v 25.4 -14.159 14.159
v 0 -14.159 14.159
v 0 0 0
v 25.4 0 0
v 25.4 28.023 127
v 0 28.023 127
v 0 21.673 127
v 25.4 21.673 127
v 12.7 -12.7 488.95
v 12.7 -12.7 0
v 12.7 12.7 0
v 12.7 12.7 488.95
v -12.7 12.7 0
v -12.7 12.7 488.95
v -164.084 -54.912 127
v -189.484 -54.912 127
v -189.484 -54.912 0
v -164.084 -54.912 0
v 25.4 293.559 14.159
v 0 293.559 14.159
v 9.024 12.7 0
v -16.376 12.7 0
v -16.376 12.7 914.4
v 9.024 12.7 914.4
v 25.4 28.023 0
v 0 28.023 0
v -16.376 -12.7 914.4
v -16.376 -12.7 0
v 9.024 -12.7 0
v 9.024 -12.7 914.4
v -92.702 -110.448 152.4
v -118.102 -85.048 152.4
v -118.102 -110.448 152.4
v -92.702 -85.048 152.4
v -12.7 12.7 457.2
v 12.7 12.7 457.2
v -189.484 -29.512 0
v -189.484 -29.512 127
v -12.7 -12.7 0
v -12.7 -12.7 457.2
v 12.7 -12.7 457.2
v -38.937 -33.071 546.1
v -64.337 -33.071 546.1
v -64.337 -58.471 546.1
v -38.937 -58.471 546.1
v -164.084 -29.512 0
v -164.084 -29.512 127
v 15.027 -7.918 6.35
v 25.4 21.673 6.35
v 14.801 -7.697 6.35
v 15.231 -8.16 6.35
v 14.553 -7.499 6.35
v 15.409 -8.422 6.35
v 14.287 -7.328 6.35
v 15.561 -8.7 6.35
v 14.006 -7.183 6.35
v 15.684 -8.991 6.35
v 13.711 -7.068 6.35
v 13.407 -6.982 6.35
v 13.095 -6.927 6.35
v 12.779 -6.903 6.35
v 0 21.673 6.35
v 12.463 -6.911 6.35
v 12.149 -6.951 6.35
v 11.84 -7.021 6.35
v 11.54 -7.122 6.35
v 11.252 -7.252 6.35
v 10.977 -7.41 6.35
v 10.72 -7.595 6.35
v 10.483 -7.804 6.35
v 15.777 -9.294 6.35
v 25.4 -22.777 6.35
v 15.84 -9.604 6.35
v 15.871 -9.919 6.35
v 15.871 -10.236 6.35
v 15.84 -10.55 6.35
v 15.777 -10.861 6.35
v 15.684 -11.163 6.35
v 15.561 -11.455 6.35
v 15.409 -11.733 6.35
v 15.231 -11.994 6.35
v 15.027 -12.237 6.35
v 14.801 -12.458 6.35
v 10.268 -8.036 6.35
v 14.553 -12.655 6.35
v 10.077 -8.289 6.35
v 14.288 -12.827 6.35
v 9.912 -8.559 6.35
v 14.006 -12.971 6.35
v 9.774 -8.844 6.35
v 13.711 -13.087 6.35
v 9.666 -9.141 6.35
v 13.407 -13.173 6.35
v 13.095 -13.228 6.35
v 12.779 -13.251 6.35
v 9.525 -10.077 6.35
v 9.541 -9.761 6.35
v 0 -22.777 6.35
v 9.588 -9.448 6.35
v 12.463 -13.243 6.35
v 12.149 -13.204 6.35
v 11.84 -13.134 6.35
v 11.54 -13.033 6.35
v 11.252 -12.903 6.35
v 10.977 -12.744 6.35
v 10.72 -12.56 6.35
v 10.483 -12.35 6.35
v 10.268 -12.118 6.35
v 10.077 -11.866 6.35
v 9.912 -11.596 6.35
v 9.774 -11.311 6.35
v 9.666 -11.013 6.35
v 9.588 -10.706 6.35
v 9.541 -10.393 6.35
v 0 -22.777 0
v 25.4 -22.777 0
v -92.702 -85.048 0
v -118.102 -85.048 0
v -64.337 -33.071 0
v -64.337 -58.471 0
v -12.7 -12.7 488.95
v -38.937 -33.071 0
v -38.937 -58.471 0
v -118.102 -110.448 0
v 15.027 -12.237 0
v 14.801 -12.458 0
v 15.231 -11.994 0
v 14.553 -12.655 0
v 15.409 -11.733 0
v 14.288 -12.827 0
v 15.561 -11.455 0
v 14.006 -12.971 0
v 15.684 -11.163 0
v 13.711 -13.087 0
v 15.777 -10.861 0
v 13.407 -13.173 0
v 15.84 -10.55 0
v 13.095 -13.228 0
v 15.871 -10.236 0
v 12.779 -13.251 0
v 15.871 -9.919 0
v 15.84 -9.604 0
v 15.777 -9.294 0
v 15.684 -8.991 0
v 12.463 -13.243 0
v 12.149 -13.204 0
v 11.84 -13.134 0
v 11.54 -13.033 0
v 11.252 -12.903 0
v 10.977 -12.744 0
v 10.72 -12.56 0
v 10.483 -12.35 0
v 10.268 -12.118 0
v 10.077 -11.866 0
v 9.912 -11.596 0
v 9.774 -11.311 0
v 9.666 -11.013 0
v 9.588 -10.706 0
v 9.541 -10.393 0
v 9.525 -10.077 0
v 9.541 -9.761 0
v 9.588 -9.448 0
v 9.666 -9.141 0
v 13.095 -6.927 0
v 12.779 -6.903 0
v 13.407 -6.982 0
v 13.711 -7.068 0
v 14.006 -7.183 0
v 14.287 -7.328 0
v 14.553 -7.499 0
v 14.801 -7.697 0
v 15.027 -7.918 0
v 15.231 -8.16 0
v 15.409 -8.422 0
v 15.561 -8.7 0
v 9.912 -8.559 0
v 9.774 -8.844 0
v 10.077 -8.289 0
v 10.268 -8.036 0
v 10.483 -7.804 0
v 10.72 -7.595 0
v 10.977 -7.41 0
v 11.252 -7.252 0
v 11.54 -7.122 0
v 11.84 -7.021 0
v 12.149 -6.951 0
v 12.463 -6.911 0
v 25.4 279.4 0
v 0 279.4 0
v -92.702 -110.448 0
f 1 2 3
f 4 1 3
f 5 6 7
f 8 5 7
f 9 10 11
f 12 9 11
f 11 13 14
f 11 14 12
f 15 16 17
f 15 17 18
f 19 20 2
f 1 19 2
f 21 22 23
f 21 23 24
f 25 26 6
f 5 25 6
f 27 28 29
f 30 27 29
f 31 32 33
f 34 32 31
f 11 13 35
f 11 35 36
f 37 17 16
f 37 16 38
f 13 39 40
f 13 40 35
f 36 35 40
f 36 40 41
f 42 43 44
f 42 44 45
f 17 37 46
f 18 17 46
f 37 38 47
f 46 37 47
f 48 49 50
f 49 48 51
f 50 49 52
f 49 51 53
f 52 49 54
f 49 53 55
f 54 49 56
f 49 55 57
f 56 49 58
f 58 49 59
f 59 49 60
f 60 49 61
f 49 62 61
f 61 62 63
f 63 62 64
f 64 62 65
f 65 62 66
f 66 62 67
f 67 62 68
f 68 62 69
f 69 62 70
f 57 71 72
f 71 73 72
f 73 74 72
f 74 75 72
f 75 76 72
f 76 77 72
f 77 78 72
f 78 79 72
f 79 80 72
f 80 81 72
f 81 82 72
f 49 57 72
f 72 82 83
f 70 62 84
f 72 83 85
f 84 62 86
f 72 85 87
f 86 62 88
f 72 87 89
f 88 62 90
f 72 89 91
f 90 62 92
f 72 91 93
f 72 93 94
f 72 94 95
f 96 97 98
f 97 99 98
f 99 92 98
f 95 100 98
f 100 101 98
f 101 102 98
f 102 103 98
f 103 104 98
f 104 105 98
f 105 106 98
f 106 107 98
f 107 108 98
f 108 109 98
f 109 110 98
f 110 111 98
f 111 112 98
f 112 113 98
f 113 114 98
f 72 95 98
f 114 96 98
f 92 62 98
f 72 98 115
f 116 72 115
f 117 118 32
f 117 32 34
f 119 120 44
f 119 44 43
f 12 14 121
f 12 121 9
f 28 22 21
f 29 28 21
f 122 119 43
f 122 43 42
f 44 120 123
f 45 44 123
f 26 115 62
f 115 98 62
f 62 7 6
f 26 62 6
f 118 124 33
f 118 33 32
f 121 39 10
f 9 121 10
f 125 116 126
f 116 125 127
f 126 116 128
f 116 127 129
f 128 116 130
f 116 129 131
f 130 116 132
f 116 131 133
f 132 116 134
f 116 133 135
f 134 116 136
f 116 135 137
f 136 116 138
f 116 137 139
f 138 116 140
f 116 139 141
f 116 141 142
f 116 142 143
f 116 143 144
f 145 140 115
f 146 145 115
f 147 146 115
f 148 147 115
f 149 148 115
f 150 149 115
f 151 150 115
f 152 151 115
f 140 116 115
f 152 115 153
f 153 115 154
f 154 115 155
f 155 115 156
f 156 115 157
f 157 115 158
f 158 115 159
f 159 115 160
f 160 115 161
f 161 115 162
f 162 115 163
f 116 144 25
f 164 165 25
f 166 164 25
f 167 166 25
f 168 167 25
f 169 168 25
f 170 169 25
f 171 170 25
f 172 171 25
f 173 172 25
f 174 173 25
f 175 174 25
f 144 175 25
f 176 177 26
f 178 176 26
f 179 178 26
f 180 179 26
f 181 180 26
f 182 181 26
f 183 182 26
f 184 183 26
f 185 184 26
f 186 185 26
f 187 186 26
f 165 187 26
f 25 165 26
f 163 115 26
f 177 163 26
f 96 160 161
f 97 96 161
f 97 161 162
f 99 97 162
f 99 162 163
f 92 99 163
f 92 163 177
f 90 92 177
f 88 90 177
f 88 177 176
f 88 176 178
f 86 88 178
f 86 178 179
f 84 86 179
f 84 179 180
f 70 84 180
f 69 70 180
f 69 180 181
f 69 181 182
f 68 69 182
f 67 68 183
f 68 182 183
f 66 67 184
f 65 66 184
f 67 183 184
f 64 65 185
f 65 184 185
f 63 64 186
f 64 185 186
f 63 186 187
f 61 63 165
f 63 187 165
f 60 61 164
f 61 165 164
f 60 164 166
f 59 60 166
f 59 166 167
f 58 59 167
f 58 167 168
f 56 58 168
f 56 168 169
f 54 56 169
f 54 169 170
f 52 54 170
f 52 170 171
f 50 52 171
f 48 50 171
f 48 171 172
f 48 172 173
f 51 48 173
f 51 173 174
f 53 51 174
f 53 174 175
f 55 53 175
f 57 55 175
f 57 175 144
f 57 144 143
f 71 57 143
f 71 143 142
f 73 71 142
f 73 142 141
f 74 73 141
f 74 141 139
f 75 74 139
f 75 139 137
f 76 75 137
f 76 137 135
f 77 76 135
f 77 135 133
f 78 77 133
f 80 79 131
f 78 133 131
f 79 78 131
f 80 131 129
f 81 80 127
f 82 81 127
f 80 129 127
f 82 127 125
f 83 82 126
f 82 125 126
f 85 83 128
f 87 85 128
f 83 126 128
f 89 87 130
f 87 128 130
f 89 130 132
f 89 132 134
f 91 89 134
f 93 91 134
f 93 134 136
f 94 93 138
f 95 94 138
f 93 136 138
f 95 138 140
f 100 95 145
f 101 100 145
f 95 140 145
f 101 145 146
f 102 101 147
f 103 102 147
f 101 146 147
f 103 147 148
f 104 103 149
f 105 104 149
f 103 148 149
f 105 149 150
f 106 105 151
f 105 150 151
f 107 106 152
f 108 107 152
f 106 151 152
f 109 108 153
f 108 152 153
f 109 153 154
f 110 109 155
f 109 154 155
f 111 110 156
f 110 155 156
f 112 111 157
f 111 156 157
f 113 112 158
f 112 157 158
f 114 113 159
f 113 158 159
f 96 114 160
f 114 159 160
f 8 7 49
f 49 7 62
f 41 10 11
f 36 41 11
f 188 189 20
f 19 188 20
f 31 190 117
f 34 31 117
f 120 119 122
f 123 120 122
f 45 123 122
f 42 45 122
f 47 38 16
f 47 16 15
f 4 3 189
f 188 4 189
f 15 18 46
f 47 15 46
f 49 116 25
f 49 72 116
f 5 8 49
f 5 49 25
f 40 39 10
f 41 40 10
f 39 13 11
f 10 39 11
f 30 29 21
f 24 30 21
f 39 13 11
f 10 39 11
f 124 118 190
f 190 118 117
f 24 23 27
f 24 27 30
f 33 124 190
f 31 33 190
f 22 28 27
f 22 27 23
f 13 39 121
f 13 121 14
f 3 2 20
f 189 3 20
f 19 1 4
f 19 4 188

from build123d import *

# Parameters (mm, degrees)
F0_W      = 25.4
F0_H      = 25.4
F1_DEPTH  = 457.2
F2_W      = 25.4
F2_H      = 25.4
F3_DEPTH  = 546.1
F5_DEPTH  = 25.4
F6_W      = 25.4
F6_H      = 25.4
F7_DEPTH  = 127
F8_W      = 25.4
F8_H      = 25.4
F9_DEPTH  = 152.4
F11_DEPTH = 25.4
F12_W     = 25.4
F12_H     = 25.4
F13_DEPTH = 914.4
F14_W     = 25.4
F14_H     = 25.4
F15_DEPTH = 488.95
F17_D     = 6.35
F17_DEPTH = 25.4
F17_TIP   = 1.9077324654


with BuildPart() as f1:
    # F0 (on Top) → F1 (new body)
    with BuildSketch(Plane.XY):
        Rectangle(F0_W, F0_H)
    extrude(amount=F1_DEPTH)


with BuildPart() as f3:
    # F2 (on Top) → F3 (new body)
    with BuildSketch(Plane.XY):
        with Locations((-51.6366362572, -45.7707265022)):
            Rectangle(F2_W, F2_H)
    extrude(amount=F3_DEPTH)


with BuildPart() as f5:
    # F4 (on Right) → F5 (new body)
    with BuildSketch(Plane.YZ):
        Polygon((-22.777274251, 0), (28.022725749, 0), (28.022725749, 127), (21.672725749, 127), (21.672725749, 6.35), (-22.777274251, 6.35), align=None)
    extrude(amount=F5_DEPTH)

    # F17
    with Locations(Plane.XY.offset(6.35)):
        with Locations((12.7, -10.077274251)):
            Hole(F17_D / 2, depth=F17_DEPTH)
            with Locations((0, 0, -(F17_DEPTH + F17_TIP / 2))):  # 118° drill point
                Cone(0, F17_D / 2, F17_TIP, mode=Mode.SUBTRACT)


with BuildPart() as f7:
    # F6 (on Top) → F7 (new body)
    with BuildSketch(Plane.XY):
        with Locations((-176.7839704037, -42.2121815711)):
            Rectangle(F6_W, F6_H)
    extrude(amount=F7_DEPTH)


with BuildPart() as f9:
    # F8 (on Top) → F9 (new body)
    with BuildSketch(Plane.XY):
        with Locations((-105.4023589611, -97.7482430965)):
            Rectangle(F8_W, F8_H)
    extrude(amount=F9_DEPTH)


with BuildPart() as f11:
    # F10 (on Right) → F11 (new body)
    with BuildSketch(Plane.YZ):
        Polygon((-14.1594959423, 14.1594959423), (0, 0), (279.4, 0), (293.5594959423, 14.1594959423), align=None)
    extrude(amount=F11_DEPTH)


with BuildPart() as f13:
    # F12 (on Top) → F13 (new body)
    with BuildSketch(Plane.XY):
        with Locations((-3.6760638468, 0)):
            Rectangle(F12_W, F12_H)
    extrude(amount=F13_DEPTH)


with BuildPart() as f15:
    # F14 (on Top) → F15 (new body)
    with BuildSketch(Plane.XY):
        Rectangle(F14_W, F14_H)
    extrude(amount=F15_DEPTH)


solid = Compound([f1.part, f3.part, f5.part, f7.part, f9.part, f11.part, f13.part, f15.part])
